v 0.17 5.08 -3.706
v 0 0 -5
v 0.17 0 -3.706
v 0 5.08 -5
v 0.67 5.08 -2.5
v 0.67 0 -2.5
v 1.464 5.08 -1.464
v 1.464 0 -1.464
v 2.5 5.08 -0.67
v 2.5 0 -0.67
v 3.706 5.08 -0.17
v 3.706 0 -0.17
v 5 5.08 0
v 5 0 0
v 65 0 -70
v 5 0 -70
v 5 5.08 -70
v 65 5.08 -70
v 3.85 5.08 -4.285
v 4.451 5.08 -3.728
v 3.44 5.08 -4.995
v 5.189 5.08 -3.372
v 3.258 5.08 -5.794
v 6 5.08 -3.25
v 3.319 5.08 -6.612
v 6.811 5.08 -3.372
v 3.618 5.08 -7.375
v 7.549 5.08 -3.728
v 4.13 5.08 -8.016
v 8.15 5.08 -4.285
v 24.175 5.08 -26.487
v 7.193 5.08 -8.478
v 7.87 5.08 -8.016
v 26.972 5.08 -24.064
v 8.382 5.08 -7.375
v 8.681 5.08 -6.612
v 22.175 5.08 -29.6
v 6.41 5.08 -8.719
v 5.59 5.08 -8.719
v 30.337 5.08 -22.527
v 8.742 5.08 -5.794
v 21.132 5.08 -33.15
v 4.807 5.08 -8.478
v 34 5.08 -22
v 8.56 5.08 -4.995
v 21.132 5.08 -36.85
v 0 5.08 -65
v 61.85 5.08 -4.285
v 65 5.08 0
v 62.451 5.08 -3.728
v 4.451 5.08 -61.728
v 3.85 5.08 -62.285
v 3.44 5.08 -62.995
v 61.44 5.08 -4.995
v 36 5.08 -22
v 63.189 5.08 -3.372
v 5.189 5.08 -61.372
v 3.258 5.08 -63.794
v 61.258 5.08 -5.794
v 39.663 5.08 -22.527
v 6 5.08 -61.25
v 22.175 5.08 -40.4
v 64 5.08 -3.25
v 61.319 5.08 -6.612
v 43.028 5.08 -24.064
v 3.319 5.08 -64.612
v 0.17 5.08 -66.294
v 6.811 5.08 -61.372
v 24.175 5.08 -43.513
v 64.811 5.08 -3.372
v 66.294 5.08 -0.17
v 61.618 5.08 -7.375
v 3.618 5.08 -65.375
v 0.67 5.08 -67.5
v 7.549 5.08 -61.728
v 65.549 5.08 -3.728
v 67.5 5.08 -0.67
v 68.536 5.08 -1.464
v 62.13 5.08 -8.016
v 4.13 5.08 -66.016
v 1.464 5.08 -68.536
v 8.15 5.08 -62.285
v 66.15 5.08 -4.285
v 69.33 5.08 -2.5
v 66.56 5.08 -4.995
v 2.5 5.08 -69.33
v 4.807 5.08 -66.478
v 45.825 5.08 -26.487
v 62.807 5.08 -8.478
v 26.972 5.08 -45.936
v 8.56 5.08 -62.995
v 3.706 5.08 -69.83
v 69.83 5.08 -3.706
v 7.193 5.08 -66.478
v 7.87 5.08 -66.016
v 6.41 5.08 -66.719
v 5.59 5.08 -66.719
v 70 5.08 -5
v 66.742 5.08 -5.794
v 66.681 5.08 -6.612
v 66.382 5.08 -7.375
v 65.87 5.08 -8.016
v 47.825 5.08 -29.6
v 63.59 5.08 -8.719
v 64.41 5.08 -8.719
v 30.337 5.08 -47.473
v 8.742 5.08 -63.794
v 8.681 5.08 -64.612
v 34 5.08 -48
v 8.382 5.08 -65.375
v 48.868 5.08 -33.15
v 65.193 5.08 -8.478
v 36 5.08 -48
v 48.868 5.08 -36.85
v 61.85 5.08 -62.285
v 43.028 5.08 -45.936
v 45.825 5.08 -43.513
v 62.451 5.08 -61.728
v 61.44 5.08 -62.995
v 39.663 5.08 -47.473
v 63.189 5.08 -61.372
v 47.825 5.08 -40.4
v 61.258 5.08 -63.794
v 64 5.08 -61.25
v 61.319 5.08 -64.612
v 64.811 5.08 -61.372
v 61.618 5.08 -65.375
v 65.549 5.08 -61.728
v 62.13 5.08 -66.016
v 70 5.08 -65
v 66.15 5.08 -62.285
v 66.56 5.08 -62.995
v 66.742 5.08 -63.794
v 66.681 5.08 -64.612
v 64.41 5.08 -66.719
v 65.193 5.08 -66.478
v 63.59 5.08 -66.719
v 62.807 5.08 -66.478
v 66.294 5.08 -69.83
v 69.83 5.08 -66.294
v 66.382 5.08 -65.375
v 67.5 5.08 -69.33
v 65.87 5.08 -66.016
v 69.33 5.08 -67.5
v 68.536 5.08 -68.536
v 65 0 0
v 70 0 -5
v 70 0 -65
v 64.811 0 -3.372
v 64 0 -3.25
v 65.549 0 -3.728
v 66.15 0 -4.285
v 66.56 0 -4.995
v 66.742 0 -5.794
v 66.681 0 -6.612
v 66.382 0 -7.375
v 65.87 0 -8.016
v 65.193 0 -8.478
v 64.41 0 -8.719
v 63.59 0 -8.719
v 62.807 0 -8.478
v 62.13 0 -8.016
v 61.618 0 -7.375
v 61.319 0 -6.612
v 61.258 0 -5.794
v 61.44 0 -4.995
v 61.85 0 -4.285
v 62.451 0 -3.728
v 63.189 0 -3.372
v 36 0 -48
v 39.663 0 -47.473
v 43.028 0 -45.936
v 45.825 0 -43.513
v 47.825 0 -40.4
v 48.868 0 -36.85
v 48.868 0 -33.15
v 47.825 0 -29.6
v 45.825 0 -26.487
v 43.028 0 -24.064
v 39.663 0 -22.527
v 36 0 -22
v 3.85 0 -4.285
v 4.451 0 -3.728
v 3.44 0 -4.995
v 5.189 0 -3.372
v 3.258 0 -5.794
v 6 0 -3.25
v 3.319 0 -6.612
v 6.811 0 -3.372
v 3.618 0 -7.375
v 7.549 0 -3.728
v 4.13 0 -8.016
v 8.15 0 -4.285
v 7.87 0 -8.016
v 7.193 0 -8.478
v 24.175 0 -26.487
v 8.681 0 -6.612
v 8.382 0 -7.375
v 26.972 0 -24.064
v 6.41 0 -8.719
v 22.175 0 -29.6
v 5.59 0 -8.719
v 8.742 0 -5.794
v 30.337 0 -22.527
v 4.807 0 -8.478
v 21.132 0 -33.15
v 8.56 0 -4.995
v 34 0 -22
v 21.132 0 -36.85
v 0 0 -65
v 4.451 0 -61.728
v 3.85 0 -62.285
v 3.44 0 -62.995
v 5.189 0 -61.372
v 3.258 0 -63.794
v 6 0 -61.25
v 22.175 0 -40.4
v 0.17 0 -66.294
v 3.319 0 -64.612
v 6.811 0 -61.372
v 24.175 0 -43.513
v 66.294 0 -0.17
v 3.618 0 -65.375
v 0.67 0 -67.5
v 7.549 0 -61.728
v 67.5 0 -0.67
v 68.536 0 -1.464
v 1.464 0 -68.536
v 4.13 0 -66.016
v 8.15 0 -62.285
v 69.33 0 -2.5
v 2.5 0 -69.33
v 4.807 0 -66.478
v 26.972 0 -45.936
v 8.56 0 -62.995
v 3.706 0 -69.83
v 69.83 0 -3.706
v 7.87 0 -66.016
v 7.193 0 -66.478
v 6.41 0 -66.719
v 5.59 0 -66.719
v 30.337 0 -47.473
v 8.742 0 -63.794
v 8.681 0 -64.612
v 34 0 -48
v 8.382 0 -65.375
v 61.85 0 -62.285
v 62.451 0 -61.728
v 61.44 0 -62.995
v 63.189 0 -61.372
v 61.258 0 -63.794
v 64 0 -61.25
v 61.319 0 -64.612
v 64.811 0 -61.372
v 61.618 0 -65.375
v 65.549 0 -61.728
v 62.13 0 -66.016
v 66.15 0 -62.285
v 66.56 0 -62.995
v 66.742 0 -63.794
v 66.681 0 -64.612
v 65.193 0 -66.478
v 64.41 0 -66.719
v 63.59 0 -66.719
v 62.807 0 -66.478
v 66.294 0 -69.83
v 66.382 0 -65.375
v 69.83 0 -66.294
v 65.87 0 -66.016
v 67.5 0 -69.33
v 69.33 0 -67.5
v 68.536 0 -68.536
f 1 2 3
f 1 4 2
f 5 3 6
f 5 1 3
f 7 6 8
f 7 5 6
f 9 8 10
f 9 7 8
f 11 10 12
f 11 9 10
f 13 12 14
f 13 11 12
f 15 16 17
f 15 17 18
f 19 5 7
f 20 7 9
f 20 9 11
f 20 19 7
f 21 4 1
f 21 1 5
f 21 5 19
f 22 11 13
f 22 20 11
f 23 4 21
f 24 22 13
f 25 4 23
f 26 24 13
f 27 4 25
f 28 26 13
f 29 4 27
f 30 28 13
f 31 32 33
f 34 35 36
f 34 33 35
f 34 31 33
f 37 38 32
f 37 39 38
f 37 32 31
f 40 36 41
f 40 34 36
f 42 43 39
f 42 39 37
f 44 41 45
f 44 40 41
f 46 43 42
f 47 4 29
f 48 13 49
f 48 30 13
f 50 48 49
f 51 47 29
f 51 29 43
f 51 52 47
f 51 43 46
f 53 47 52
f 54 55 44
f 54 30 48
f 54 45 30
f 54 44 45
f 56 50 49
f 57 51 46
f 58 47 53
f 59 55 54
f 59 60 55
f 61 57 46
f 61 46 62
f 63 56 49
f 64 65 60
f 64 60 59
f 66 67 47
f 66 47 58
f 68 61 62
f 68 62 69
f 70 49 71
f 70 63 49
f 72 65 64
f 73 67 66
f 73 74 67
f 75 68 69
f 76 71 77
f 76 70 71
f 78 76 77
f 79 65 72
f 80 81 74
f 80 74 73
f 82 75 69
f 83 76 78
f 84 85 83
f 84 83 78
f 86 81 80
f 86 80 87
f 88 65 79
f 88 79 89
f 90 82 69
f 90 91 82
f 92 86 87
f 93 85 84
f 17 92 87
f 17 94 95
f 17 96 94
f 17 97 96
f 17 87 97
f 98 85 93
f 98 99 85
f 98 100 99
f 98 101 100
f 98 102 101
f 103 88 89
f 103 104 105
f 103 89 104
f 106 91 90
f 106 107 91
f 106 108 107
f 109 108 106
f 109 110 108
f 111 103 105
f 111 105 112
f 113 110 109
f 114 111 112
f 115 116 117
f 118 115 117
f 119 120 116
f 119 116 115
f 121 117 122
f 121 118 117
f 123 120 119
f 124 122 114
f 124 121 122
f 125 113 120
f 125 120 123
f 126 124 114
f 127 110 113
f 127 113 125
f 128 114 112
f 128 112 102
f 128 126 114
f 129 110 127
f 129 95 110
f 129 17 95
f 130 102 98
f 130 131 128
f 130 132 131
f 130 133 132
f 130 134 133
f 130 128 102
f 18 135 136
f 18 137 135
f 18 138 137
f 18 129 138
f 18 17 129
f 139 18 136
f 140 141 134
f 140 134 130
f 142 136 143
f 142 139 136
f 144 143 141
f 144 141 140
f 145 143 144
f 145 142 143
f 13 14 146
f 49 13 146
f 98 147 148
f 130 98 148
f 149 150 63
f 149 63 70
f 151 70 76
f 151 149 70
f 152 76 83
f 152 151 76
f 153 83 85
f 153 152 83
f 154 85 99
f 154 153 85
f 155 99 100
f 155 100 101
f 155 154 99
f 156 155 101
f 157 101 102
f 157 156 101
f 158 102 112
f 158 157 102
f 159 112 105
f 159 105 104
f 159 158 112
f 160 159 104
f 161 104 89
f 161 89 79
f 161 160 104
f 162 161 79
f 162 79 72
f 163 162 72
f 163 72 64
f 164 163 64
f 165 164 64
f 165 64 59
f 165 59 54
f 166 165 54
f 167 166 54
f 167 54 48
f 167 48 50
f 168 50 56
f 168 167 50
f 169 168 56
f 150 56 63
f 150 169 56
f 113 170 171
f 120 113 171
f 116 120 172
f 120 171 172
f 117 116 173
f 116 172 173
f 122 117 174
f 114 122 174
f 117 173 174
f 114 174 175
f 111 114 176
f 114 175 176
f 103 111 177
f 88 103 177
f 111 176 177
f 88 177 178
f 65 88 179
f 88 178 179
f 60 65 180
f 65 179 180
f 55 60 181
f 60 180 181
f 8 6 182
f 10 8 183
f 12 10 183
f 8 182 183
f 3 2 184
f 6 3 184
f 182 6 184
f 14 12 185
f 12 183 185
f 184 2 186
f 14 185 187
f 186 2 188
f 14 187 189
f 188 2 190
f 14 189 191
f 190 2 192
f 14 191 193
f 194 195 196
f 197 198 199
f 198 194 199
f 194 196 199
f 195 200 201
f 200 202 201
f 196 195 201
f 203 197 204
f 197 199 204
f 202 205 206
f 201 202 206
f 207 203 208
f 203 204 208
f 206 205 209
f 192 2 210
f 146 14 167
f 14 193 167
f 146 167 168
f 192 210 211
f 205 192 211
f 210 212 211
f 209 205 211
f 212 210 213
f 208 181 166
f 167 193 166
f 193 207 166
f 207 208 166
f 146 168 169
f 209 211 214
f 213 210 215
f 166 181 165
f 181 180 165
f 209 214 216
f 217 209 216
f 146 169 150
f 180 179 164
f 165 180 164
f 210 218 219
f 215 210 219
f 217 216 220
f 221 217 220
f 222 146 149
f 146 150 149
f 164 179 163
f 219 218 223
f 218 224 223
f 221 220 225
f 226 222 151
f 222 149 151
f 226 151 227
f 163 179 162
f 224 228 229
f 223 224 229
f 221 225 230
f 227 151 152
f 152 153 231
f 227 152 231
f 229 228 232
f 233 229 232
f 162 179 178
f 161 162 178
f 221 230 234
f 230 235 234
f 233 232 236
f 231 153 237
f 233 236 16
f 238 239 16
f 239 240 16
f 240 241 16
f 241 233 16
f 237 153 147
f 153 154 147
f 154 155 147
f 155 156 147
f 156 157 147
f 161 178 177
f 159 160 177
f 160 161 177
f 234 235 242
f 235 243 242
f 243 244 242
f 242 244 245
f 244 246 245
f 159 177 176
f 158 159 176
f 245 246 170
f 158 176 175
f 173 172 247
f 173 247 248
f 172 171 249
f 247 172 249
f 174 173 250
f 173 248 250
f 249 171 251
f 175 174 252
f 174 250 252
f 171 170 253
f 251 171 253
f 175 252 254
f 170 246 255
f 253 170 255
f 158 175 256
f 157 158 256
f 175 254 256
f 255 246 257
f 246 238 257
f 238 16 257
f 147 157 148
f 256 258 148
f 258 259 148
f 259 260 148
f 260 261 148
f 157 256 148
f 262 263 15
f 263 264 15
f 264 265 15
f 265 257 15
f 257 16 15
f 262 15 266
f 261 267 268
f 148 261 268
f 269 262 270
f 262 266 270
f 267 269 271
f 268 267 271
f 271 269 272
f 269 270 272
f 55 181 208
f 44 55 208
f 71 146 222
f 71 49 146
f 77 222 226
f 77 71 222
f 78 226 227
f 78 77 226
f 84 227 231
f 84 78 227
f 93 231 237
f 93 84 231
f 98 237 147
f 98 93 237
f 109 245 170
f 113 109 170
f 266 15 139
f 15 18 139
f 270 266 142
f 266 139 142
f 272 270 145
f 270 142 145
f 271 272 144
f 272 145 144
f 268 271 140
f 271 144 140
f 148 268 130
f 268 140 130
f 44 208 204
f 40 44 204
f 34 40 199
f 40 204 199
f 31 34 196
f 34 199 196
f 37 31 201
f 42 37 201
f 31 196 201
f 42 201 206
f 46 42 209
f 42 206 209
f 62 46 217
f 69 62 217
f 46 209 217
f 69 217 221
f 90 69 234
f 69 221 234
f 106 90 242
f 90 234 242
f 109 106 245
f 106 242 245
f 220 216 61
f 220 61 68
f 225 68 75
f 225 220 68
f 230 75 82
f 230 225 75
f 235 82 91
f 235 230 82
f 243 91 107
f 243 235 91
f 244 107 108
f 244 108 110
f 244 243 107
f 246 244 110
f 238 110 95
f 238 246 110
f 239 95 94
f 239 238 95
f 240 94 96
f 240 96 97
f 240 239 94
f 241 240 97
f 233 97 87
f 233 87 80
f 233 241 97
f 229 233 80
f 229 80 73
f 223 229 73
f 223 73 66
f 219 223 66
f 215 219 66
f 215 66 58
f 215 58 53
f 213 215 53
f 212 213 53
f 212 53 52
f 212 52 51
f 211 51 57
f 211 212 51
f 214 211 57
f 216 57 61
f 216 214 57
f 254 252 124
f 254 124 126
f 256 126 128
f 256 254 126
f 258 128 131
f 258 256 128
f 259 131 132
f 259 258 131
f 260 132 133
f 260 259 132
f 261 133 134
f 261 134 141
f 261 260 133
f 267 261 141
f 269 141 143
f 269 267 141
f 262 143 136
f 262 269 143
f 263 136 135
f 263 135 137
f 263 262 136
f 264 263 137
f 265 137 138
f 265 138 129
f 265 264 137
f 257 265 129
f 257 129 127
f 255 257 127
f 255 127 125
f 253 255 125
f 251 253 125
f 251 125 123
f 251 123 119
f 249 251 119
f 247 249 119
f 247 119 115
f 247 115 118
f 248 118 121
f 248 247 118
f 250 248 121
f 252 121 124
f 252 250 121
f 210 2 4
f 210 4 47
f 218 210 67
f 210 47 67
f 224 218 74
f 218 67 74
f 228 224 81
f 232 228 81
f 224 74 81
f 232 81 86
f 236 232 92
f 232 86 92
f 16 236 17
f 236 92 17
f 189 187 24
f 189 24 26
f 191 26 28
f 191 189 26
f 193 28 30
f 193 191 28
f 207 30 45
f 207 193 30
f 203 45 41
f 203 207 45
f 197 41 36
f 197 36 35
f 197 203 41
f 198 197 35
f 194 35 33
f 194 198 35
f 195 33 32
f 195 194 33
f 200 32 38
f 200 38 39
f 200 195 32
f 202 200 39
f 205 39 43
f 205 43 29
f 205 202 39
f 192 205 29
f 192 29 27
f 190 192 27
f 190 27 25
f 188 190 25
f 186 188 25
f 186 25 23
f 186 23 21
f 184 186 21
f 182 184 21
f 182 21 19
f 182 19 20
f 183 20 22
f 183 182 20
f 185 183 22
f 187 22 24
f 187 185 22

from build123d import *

# Parameters (mm, degrees)
SKETCH1_W           = 70
SKETCH1_H           = 70
SKETCH1_R           = 2.75
BOSS_EXTRUDE1_DEPTH = 5.08
FILLET1_R           = 5


with BuildPart() as part:
    # Sketch1 → Boss-Extrude1 (new body)
    with BuildSketch(Plane(origin=(0, 0, 0), x_dir=(1, 0, 0), z_dir=(0, 1, 0))):
        with Locations((35, 35)):
            Rectangle(SKETCH1_W, SKETCH1_H)
        with Locations(Location((6, 64, 0), (0, 0, 270))):
            Circle(SKETCH1_R, mode=Mode.SUBTRACT)
        with Locations(Location((64, 64, 0), (0, 0, 270))):
            Circle(SKETCH1_R, mode=Mode.SUBTRACT)
        with Locations(Location((64, 6, 0), (0, 0, 270))):
            Circle(SKETCH1_R, mode=Mode.SUBTRACT)
        with Locations(Location((6, 6, 0), (0, 0, 270))):
            Circle(SKETCH1_R, mode=Mode.SUBTRACT)
        with BuildLine():
            Line((34, 48), (36, 48))
            ThreePointArc((36, 48), (49, 35), (36, 22))
            Line((36, 22), (34, 22))
            ThreePointArc((34, 22), (21, 35), (34, 48))
        make_face(mode=Mode.SUBTRACT)
    extrude(amount=BOSS_EXTRUDE1_DEPTH)

    # Fillet1
    fillet1_edges = [part.edges().sort_by_distance(p)[0] for p in [
        (0, 2.54, -70),
        (70, 2.54, -70),
        (70, 2.54, 0),
        (0, 2.54, 0),
    ]]
    fillet(fillet1_edges, radius=FILLET1_R)


solid = part.part
